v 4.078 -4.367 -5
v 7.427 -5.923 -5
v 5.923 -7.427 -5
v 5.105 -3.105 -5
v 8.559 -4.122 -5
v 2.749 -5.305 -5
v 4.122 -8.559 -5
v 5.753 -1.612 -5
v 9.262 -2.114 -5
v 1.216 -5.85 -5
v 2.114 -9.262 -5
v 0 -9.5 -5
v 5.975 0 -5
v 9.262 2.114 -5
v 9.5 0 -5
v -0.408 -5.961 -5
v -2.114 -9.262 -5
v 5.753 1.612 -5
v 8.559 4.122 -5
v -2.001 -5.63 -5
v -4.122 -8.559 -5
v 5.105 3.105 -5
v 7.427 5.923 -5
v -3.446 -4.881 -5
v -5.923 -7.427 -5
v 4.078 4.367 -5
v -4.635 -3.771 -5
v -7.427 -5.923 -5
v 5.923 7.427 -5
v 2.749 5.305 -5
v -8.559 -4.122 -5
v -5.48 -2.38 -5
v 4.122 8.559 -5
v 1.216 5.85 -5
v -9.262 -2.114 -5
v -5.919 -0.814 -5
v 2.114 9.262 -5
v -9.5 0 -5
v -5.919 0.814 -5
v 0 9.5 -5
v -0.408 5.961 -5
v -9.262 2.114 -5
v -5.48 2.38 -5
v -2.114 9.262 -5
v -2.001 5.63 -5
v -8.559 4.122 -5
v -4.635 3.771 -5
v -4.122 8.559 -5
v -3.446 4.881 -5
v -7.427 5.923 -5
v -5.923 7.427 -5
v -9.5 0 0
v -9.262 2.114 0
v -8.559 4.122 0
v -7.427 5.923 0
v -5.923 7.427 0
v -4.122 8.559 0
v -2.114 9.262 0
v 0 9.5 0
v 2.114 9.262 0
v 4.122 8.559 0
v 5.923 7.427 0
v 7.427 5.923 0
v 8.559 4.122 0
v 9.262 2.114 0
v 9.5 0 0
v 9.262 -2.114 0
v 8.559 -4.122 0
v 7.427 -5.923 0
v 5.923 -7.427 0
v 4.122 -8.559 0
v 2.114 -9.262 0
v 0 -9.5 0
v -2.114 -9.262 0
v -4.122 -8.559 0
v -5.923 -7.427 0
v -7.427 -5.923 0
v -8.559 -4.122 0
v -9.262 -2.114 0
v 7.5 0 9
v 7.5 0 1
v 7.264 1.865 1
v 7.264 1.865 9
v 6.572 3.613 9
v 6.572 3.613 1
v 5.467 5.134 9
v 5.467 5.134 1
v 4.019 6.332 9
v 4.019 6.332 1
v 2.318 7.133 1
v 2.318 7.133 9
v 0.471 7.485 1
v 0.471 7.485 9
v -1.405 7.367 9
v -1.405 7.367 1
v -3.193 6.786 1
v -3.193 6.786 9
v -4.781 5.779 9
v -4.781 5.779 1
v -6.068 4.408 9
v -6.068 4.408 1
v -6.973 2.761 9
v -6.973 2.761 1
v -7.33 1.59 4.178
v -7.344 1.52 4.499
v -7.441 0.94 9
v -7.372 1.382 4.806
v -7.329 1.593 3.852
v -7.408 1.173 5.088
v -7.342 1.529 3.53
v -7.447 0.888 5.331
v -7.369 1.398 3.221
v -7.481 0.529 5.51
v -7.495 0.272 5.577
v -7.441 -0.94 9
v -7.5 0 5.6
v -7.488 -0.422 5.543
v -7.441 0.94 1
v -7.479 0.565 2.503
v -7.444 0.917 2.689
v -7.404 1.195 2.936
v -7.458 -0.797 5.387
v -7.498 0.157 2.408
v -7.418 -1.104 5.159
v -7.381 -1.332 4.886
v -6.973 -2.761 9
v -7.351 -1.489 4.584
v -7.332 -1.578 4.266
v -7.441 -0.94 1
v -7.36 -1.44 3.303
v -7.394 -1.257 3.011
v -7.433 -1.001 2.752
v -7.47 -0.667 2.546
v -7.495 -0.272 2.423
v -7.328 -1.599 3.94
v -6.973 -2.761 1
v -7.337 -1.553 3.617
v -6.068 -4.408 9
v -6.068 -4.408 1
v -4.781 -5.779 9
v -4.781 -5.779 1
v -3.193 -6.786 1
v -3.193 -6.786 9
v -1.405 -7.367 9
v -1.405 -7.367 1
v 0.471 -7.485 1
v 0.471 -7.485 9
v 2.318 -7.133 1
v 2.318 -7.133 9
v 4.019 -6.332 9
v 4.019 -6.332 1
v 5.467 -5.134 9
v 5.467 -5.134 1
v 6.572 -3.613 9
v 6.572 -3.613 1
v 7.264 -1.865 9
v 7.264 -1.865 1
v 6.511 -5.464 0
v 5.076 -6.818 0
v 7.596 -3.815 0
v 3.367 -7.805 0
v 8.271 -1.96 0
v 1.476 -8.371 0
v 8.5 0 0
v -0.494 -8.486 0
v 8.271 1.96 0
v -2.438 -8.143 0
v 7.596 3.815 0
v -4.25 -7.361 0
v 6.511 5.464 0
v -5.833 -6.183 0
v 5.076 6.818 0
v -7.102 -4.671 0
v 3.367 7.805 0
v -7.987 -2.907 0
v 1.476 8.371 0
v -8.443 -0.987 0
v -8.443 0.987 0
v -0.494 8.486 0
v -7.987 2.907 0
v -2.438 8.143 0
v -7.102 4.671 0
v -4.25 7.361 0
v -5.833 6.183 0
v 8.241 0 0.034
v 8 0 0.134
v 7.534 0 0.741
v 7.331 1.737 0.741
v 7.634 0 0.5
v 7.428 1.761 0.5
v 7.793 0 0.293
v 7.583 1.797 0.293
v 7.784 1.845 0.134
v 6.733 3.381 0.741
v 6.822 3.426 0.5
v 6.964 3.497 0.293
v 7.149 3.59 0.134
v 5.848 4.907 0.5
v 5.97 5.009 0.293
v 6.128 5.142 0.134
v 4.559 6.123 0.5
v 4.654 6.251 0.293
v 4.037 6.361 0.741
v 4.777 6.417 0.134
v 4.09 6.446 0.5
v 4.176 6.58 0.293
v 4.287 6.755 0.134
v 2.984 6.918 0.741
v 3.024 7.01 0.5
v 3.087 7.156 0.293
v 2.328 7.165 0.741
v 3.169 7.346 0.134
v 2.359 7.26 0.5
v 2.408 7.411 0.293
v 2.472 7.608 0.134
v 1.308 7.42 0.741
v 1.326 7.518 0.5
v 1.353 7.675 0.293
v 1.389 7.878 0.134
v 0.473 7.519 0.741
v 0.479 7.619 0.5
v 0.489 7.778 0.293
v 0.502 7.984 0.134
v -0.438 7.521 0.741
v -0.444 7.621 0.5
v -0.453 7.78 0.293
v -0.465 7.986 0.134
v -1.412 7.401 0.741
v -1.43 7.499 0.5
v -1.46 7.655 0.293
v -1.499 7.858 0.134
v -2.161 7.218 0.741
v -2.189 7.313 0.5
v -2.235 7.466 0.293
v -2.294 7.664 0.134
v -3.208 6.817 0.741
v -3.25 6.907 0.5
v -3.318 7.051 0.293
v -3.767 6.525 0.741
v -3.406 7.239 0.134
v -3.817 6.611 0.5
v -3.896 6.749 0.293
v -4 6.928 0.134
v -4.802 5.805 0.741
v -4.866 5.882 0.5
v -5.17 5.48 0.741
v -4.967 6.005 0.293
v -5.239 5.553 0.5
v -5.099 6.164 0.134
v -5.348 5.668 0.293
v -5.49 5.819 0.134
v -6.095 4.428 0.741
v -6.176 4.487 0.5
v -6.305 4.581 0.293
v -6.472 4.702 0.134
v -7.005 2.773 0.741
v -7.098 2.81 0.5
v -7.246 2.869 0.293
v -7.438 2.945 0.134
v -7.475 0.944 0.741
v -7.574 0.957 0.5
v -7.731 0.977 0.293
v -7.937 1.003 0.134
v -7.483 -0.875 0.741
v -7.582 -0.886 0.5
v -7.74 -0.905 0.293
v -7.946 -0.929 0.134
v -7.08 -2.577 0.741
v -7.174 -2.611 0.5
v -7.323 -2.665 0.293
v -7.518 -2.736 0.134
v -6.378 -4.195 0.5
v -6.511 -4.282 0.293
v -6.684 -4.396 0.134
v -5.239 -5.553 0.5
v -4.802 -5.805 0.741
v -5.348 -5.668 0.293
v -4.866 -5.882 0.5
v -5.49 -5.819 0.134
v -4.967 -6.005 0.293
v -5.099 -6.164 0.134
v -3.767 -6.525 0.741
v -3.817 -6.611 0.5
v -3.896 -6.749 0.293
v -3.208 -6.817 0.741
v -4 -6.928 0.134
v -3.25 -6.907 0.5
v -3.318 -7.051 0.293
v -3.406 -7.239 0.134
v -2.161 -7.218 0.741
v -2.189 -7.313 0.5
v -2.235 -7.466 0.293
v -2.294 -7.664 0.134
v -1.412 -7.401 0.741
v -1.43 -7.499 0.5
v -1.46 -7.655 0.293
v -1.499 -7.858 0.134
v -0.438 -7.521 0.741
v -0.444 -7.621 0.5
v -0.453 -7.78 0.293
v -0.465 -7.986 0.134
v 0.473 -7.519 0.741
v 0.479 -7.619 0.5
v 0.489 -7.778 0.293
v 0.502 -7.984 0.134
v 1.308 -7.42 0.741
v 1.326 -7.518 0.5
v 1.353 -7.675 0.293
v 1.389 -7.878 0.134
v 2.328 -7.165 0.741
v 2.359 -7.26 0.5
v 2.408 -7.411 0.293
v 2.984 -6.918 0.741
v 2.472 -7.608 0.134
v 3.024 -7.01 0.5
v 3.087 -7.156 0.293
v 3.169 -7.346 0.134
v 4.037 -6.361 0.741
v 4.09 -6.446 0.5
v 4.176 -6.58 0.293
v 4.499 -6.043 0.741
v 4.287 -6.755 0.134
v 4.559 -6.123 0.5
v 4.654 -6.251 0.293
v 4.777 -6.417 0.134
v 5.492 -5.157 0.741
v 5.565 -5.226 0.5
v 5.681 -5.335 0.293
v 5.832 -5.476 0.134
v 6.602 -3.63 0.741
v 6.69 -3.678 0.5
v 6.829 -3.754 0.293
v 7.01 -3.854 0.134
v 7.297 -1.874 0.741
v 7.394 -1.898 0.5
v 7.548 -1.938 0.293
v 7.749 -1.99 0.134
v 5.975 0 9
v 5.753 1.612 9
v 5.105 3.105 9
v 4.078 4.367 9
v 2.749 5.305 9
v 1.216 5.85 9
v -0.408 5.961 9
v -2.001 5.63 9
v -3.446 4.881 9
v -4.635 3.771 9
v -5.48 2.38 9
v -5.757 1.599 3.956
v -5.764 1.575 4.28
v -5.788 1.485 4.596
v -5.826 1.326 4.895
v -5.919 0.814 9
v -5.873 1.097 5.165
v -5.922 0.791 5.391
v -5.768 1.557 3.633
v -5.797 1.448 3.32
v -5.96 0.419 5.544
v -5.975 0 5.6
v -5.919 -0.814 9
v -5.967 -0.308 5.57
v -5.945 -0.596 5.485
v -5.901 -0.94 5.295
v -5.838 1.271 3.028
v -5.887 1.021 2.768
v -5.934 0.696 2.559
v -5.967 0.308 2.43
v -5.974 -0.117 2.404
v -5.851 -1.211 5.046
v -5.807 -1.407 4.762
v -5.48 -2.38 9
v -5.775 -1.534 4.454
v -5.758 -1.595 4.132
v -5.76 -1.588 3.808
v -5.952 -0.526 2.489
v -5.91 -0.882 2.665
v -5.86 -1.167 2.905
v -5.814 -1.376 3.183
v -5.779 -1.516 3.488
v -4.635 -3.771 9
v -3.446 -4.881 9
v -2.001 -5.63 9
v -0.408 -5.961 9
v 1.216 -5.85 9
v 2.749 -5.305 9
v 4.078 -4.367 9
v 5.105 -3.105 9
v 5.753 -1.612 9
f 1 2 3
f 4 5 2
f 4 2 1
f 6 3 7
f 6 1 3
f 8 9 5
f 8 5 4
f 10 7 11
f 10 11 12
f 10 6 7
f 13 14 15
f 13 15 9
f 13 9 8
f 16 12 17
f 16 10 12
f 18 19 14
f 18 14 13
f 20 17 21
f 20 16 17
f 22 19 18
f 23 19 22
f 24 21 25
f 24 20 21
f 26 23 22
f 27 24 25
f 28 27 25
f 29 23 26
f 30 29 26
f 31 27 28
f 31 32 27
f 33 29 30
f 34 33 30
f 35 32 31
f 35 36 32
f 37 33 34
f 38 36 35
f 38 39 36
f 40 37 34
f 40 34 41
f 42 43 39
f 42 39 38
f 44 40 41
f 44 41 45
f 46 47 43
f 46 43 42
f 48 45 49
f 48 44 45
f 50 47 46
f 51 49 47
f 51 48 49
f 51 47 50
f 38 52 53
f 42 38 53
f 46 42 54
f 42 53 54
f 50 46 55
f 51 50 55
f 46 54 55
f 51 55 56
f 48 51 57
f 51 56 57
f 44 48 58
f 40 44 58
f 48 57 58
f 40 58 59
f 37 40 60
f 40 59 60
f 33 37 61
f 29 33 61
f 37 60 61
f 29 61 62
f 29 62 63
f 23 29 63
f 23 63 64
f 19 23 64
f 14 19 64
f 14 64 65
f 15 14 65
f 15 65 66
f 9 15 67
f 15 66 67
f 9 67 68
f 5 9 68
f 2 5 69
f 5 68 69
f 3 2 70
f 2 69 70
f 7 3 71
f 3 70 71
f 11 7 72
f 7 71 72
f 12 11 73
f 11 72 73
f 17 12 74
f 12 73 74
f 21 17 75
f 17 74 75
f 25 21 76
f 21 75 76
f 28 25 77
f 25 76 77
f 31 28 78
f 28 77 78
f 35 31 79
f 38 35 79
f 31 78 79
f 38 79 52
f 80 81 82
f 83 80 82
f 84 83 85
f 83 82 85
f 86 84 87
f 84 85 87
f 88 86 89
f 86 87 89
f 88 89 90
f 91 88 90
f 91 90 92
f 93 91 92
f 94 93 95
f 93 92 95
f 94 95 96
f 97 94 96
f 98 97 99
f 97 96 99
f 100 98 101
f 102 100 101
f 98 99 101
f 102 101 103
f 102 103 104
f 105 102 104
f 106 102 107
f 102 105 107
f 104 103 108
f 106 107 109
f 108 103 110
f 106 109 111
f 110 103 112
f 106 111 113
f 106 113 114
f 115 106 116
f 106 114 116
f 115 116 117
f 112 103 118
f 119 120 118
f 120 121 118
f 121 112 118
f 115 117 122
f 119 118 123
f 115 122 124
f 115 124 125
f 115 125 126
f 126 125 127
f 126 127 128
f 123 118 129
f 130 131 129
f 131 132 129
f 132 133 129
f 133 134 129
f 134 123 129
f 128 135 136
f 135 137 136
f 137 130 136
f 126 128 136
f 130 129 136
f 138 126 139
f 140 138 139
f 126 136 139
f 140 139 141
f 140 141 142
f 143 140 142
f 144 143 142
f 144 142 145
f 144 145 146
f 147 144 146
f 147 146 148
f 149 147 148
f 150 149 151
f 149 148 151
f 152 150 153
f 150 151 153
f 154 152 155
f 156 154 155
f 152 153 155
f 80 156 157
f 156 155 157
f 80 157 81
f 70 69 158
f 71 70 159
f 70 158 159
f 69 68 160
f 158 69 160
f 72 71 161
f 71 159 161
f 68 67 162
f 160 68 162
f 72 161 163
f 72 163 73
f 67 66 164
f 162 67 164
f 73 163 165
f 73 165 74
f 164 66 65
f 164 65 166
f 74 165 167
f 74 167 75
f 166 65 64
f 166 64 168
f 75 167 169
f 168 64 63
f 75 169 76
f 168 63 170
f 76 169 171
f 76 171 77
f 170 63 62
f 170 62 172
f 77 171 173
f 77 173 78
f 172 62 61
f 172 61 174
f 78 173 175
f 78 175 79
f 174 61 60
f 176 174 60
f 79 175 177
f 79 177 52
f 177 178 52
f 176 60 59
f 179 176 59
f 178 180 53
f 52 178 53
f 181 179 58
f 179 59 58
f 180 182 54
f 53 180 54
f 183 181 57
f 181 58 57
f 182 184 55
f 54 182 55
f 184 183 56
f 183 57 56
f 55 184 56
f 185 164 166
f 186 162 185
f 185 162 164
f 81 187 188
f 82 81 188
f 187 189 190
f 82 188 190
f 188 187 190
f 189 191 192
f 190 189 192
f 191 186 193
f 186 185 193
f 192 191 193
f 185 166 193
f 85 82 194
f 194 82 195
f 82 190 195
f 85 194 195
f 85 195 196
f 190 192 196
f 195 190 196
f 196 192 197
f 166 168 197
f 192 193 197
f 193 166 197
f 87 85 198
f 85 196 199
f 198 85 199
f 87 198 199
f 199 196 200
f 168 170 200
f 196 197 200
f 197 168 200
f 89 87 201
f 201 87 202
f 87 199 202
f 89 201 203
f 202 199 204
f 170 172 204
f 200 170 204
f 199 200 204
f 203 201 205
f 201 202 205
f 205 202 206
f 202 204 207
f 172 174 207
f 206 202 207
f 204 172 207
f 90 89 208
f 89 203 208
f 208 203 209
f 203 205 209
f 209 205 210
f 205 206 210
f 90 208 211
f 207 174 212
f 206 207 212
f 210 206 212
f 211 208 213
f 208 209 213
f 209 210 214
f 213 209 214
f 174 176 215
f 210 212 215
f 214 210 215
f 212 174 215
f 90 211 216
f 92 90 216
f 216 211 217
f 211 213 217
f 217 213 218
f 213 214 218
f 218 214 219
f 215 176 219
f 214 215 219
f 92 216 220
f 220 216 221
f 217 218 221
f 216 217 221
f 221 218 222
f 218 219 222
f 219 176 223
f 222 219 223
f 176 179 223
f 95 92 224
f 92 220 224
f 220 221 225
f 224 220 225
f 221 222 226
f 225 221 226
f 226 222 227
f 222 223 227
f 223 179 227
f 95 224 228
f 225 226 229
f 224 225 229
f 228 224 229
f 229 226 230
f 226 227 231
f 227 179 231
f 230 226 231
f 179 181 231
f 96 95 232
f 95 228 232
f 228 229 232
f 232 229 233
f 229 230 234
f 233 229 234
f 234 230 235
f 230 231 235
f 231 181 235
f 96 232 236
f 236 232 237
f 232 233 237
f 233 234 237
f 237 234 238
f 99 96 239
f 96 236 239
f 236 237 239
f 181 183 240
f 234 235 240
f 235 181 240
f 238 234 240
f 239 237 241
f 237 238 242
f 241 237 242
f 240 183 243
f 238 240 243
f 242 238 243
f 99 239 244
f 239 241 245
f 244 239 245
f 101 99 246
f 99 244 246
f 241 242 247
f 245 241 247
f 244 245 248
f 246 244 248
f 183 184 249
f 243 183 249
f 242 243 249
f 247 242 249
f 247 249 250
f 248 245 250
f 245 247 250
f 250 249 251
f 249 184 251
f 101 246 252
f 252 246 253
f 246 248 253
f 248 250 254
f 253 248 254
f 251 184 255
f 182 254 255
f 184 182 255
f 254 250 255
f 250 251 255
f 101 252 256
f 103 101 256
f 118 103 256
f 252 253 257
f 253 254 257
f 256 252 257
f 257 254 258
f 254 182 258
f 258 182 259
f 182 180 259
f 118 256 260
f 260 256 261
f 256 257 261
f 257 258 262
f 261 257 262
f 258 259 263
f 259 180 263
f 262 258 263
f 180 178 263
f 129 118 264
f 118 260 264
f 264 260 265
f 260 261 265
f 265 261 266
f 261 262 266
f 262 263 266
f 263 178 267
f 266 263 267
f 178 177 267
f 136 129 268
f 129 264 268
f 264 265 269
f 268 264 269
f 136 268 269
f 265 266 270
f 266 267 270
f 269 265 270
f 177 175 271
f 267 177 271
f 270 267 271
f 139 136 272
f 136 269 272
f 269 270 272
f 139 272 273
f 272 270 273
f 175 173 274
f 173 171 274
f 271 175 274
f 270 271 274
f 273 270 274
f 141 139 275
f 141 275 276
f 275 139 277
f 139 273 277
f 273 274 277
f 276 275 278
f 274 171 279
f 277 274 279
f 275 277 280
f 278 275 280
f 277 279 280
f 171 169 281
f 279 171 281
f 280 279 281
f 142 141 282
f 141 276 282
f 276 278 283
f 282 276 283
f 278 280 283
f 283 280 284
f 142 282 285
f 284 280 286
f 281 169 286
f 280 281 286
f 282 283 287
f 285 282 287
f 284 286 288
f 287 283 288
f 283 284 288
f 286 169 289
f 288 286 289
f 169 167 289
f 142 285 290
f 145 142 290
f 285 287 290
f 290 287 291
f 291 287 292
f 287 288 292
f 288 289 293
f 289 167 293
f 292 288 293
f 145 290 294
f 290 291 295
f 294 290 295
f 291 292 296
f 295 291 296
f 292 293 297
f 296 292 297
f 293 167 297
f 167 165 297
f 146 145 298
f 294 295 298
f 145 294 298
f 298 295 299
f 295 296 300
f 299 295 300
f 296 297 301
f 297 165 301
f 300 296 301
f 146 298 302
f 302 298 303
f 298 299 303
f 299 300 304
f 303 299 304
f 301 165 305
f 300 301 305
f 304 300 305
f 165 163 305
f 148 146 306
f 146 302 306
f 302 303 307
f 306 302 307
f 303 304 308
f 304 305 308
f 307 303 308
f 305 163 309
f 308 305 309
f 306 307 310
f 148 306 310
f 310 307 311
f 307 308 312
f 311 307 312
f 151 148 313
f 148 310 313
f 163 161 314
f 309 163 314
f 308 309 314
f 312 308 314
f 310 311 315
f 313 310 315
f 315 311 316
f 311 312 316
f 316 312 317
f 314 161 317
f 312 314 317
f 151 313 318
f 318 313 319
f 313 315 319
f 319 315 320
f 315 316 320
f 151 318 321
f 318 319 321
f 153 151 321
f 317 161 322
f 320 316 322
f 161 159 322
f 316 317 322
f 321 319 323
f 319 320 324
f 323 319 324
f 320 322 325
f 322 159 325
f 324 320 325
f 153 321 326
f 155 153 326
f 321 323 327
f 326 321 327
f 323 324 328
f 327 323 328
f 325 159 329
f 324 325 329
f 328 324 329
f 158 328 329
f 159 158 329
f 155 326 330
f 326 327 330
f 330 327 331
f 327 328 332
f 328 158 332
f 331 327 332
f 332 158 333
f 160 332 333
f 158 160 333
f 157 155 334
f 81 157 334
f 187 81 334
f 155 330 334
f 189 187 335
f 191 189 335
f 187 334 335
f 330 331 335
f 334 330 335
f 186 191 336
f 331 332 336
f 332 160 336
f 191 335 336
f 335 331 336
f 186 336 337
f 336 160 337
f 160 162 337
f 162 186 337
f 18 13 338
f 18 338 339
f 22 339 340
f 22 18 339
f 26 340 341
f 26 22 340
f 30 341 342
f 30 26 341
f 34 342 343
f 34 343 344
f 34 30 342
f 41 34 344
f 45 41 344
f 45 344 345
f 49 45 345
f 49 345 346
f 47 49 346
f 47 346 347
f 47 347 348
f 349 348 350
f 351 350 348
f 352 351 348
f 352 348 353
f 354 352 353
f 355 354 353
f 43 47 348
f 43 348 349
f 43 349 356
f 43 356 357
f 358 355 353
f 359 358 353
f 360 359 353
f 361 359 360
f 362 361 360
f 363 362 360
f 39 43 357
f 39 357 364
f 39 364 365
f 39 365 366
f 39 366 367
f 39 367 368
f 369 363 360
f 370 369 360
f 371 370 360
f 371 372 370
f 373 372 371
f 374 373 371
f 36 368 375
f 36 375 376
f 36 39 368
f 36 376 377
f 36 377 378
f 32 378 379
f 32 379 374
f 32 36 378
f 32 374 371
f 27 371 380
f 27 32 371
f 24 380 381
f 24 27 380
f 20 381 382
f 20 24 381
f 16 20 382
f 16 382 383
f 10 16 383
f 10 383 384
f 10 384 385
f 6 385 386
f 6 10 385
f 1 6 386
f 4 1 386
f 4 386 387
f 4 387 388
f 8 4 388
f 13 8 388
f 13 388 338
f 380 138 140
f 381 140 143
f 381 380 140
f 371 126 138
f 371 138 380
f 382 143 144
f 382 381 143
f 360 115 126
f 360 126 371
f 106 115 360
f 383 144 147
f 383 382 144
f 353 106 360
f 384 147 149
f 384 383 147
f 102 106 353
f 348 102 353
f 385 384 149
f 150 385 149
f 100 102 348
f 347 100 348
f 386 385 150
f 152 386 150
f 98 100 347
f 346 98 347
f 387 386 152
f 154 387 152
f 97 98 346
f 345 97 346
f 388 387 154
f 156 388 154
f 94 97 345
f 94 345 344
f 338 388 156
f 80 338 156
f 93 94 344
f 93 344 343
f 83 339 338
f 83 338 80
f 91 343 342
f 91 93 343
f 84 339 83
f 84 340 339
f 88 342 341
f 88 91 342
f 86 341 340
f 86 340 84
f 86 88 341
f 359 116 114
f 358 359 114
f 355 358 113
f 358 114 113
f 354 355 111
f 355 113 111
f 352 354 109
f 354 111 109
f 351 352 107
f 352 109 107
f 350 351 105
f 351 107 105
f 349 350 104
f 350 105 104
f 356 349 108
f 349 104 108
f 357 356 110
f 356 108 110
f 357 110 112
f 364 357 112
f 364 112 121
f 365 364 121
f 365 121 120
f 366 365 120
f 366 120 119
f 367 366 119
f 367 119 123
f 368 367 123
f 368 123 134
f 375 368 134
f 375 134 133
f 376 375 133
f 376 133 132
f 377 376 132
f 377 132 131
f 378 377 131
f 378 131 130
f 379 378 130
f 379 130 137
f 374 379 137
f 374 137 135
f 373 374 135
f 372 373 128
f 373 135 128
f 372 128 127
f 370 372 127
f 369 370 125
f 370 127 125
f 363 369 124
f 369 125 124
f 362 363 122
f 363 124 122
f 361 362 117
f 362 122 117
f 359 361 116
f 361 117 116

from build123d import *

# Parameters (mm, degrees)
SKETCH2_R           = 7.5
SKETCH2_R_2         = 5.975
BOSS_EXTRUDE1_DEPTH = 9
SKETCH3_R           = 9.5
BOSS_EXTRUDE2_DEPTH = 5
CUT_EXTRUDE1_START  = -5
SKETCH4_R           = 5.975
CUT_EXTRUDE1_DEPTH  = 5
SKETCH5_R           = 1.6
CUT_EXTRUDE2_DEPTH  = 12
FILLET1_R           = 1


with BuildPart() as part:
    # Sketch2 → Boss-Extrude1 (new body)
    with BuildSketch(Plane.XY):
        Circle(SKETCH2_R)
        Circle(SKETCH2_R_2, mode=Mode.SUBTRACT)
    extrude(amount=BOSS_EXTRUDE1_DEPTH)

    # Sketch3 → Boss-Extrude2 (add)
    with BuildSketch(Plane(origin=(0, 0, 0), x_dir=(-1, 0, 0), z_dir=(0, 0, -1))):
        Circle(SKETCH3_R)
    extrude(amount=BOSS_EXTRUDE2_DEPTH)

    # Sketch4 → Cut-Extrude1 (cut)
    with BuildSketch(Plane.XY.offset(CUT_EXTRUDE1_START)):
        Circle(SKETCH4_R)
    extrude(amount=CUT_EXTRUDE1_DEPTH, mode=Mode.SUBTRACT)

    # Sketch5 → Cut-Extrude2 (cut)
    with BuildSketch(Plane.ZY.offset(7.5)):
        with Locations((4, 0)):
            Circle(SKETCH5_R)
    extrude(amount=-CUT_EXTRUDE2_DEPTH, mode=Mode.SUBTRACT)

    # Fillet1
    fillet1_edges = [part.edges().sort_by_distance(p)[0] for p in [
        (-7.5, 0, 0),
    ]]
    fillet(fillet1_edges, radius=FILLET1_R)


solid = part.part
